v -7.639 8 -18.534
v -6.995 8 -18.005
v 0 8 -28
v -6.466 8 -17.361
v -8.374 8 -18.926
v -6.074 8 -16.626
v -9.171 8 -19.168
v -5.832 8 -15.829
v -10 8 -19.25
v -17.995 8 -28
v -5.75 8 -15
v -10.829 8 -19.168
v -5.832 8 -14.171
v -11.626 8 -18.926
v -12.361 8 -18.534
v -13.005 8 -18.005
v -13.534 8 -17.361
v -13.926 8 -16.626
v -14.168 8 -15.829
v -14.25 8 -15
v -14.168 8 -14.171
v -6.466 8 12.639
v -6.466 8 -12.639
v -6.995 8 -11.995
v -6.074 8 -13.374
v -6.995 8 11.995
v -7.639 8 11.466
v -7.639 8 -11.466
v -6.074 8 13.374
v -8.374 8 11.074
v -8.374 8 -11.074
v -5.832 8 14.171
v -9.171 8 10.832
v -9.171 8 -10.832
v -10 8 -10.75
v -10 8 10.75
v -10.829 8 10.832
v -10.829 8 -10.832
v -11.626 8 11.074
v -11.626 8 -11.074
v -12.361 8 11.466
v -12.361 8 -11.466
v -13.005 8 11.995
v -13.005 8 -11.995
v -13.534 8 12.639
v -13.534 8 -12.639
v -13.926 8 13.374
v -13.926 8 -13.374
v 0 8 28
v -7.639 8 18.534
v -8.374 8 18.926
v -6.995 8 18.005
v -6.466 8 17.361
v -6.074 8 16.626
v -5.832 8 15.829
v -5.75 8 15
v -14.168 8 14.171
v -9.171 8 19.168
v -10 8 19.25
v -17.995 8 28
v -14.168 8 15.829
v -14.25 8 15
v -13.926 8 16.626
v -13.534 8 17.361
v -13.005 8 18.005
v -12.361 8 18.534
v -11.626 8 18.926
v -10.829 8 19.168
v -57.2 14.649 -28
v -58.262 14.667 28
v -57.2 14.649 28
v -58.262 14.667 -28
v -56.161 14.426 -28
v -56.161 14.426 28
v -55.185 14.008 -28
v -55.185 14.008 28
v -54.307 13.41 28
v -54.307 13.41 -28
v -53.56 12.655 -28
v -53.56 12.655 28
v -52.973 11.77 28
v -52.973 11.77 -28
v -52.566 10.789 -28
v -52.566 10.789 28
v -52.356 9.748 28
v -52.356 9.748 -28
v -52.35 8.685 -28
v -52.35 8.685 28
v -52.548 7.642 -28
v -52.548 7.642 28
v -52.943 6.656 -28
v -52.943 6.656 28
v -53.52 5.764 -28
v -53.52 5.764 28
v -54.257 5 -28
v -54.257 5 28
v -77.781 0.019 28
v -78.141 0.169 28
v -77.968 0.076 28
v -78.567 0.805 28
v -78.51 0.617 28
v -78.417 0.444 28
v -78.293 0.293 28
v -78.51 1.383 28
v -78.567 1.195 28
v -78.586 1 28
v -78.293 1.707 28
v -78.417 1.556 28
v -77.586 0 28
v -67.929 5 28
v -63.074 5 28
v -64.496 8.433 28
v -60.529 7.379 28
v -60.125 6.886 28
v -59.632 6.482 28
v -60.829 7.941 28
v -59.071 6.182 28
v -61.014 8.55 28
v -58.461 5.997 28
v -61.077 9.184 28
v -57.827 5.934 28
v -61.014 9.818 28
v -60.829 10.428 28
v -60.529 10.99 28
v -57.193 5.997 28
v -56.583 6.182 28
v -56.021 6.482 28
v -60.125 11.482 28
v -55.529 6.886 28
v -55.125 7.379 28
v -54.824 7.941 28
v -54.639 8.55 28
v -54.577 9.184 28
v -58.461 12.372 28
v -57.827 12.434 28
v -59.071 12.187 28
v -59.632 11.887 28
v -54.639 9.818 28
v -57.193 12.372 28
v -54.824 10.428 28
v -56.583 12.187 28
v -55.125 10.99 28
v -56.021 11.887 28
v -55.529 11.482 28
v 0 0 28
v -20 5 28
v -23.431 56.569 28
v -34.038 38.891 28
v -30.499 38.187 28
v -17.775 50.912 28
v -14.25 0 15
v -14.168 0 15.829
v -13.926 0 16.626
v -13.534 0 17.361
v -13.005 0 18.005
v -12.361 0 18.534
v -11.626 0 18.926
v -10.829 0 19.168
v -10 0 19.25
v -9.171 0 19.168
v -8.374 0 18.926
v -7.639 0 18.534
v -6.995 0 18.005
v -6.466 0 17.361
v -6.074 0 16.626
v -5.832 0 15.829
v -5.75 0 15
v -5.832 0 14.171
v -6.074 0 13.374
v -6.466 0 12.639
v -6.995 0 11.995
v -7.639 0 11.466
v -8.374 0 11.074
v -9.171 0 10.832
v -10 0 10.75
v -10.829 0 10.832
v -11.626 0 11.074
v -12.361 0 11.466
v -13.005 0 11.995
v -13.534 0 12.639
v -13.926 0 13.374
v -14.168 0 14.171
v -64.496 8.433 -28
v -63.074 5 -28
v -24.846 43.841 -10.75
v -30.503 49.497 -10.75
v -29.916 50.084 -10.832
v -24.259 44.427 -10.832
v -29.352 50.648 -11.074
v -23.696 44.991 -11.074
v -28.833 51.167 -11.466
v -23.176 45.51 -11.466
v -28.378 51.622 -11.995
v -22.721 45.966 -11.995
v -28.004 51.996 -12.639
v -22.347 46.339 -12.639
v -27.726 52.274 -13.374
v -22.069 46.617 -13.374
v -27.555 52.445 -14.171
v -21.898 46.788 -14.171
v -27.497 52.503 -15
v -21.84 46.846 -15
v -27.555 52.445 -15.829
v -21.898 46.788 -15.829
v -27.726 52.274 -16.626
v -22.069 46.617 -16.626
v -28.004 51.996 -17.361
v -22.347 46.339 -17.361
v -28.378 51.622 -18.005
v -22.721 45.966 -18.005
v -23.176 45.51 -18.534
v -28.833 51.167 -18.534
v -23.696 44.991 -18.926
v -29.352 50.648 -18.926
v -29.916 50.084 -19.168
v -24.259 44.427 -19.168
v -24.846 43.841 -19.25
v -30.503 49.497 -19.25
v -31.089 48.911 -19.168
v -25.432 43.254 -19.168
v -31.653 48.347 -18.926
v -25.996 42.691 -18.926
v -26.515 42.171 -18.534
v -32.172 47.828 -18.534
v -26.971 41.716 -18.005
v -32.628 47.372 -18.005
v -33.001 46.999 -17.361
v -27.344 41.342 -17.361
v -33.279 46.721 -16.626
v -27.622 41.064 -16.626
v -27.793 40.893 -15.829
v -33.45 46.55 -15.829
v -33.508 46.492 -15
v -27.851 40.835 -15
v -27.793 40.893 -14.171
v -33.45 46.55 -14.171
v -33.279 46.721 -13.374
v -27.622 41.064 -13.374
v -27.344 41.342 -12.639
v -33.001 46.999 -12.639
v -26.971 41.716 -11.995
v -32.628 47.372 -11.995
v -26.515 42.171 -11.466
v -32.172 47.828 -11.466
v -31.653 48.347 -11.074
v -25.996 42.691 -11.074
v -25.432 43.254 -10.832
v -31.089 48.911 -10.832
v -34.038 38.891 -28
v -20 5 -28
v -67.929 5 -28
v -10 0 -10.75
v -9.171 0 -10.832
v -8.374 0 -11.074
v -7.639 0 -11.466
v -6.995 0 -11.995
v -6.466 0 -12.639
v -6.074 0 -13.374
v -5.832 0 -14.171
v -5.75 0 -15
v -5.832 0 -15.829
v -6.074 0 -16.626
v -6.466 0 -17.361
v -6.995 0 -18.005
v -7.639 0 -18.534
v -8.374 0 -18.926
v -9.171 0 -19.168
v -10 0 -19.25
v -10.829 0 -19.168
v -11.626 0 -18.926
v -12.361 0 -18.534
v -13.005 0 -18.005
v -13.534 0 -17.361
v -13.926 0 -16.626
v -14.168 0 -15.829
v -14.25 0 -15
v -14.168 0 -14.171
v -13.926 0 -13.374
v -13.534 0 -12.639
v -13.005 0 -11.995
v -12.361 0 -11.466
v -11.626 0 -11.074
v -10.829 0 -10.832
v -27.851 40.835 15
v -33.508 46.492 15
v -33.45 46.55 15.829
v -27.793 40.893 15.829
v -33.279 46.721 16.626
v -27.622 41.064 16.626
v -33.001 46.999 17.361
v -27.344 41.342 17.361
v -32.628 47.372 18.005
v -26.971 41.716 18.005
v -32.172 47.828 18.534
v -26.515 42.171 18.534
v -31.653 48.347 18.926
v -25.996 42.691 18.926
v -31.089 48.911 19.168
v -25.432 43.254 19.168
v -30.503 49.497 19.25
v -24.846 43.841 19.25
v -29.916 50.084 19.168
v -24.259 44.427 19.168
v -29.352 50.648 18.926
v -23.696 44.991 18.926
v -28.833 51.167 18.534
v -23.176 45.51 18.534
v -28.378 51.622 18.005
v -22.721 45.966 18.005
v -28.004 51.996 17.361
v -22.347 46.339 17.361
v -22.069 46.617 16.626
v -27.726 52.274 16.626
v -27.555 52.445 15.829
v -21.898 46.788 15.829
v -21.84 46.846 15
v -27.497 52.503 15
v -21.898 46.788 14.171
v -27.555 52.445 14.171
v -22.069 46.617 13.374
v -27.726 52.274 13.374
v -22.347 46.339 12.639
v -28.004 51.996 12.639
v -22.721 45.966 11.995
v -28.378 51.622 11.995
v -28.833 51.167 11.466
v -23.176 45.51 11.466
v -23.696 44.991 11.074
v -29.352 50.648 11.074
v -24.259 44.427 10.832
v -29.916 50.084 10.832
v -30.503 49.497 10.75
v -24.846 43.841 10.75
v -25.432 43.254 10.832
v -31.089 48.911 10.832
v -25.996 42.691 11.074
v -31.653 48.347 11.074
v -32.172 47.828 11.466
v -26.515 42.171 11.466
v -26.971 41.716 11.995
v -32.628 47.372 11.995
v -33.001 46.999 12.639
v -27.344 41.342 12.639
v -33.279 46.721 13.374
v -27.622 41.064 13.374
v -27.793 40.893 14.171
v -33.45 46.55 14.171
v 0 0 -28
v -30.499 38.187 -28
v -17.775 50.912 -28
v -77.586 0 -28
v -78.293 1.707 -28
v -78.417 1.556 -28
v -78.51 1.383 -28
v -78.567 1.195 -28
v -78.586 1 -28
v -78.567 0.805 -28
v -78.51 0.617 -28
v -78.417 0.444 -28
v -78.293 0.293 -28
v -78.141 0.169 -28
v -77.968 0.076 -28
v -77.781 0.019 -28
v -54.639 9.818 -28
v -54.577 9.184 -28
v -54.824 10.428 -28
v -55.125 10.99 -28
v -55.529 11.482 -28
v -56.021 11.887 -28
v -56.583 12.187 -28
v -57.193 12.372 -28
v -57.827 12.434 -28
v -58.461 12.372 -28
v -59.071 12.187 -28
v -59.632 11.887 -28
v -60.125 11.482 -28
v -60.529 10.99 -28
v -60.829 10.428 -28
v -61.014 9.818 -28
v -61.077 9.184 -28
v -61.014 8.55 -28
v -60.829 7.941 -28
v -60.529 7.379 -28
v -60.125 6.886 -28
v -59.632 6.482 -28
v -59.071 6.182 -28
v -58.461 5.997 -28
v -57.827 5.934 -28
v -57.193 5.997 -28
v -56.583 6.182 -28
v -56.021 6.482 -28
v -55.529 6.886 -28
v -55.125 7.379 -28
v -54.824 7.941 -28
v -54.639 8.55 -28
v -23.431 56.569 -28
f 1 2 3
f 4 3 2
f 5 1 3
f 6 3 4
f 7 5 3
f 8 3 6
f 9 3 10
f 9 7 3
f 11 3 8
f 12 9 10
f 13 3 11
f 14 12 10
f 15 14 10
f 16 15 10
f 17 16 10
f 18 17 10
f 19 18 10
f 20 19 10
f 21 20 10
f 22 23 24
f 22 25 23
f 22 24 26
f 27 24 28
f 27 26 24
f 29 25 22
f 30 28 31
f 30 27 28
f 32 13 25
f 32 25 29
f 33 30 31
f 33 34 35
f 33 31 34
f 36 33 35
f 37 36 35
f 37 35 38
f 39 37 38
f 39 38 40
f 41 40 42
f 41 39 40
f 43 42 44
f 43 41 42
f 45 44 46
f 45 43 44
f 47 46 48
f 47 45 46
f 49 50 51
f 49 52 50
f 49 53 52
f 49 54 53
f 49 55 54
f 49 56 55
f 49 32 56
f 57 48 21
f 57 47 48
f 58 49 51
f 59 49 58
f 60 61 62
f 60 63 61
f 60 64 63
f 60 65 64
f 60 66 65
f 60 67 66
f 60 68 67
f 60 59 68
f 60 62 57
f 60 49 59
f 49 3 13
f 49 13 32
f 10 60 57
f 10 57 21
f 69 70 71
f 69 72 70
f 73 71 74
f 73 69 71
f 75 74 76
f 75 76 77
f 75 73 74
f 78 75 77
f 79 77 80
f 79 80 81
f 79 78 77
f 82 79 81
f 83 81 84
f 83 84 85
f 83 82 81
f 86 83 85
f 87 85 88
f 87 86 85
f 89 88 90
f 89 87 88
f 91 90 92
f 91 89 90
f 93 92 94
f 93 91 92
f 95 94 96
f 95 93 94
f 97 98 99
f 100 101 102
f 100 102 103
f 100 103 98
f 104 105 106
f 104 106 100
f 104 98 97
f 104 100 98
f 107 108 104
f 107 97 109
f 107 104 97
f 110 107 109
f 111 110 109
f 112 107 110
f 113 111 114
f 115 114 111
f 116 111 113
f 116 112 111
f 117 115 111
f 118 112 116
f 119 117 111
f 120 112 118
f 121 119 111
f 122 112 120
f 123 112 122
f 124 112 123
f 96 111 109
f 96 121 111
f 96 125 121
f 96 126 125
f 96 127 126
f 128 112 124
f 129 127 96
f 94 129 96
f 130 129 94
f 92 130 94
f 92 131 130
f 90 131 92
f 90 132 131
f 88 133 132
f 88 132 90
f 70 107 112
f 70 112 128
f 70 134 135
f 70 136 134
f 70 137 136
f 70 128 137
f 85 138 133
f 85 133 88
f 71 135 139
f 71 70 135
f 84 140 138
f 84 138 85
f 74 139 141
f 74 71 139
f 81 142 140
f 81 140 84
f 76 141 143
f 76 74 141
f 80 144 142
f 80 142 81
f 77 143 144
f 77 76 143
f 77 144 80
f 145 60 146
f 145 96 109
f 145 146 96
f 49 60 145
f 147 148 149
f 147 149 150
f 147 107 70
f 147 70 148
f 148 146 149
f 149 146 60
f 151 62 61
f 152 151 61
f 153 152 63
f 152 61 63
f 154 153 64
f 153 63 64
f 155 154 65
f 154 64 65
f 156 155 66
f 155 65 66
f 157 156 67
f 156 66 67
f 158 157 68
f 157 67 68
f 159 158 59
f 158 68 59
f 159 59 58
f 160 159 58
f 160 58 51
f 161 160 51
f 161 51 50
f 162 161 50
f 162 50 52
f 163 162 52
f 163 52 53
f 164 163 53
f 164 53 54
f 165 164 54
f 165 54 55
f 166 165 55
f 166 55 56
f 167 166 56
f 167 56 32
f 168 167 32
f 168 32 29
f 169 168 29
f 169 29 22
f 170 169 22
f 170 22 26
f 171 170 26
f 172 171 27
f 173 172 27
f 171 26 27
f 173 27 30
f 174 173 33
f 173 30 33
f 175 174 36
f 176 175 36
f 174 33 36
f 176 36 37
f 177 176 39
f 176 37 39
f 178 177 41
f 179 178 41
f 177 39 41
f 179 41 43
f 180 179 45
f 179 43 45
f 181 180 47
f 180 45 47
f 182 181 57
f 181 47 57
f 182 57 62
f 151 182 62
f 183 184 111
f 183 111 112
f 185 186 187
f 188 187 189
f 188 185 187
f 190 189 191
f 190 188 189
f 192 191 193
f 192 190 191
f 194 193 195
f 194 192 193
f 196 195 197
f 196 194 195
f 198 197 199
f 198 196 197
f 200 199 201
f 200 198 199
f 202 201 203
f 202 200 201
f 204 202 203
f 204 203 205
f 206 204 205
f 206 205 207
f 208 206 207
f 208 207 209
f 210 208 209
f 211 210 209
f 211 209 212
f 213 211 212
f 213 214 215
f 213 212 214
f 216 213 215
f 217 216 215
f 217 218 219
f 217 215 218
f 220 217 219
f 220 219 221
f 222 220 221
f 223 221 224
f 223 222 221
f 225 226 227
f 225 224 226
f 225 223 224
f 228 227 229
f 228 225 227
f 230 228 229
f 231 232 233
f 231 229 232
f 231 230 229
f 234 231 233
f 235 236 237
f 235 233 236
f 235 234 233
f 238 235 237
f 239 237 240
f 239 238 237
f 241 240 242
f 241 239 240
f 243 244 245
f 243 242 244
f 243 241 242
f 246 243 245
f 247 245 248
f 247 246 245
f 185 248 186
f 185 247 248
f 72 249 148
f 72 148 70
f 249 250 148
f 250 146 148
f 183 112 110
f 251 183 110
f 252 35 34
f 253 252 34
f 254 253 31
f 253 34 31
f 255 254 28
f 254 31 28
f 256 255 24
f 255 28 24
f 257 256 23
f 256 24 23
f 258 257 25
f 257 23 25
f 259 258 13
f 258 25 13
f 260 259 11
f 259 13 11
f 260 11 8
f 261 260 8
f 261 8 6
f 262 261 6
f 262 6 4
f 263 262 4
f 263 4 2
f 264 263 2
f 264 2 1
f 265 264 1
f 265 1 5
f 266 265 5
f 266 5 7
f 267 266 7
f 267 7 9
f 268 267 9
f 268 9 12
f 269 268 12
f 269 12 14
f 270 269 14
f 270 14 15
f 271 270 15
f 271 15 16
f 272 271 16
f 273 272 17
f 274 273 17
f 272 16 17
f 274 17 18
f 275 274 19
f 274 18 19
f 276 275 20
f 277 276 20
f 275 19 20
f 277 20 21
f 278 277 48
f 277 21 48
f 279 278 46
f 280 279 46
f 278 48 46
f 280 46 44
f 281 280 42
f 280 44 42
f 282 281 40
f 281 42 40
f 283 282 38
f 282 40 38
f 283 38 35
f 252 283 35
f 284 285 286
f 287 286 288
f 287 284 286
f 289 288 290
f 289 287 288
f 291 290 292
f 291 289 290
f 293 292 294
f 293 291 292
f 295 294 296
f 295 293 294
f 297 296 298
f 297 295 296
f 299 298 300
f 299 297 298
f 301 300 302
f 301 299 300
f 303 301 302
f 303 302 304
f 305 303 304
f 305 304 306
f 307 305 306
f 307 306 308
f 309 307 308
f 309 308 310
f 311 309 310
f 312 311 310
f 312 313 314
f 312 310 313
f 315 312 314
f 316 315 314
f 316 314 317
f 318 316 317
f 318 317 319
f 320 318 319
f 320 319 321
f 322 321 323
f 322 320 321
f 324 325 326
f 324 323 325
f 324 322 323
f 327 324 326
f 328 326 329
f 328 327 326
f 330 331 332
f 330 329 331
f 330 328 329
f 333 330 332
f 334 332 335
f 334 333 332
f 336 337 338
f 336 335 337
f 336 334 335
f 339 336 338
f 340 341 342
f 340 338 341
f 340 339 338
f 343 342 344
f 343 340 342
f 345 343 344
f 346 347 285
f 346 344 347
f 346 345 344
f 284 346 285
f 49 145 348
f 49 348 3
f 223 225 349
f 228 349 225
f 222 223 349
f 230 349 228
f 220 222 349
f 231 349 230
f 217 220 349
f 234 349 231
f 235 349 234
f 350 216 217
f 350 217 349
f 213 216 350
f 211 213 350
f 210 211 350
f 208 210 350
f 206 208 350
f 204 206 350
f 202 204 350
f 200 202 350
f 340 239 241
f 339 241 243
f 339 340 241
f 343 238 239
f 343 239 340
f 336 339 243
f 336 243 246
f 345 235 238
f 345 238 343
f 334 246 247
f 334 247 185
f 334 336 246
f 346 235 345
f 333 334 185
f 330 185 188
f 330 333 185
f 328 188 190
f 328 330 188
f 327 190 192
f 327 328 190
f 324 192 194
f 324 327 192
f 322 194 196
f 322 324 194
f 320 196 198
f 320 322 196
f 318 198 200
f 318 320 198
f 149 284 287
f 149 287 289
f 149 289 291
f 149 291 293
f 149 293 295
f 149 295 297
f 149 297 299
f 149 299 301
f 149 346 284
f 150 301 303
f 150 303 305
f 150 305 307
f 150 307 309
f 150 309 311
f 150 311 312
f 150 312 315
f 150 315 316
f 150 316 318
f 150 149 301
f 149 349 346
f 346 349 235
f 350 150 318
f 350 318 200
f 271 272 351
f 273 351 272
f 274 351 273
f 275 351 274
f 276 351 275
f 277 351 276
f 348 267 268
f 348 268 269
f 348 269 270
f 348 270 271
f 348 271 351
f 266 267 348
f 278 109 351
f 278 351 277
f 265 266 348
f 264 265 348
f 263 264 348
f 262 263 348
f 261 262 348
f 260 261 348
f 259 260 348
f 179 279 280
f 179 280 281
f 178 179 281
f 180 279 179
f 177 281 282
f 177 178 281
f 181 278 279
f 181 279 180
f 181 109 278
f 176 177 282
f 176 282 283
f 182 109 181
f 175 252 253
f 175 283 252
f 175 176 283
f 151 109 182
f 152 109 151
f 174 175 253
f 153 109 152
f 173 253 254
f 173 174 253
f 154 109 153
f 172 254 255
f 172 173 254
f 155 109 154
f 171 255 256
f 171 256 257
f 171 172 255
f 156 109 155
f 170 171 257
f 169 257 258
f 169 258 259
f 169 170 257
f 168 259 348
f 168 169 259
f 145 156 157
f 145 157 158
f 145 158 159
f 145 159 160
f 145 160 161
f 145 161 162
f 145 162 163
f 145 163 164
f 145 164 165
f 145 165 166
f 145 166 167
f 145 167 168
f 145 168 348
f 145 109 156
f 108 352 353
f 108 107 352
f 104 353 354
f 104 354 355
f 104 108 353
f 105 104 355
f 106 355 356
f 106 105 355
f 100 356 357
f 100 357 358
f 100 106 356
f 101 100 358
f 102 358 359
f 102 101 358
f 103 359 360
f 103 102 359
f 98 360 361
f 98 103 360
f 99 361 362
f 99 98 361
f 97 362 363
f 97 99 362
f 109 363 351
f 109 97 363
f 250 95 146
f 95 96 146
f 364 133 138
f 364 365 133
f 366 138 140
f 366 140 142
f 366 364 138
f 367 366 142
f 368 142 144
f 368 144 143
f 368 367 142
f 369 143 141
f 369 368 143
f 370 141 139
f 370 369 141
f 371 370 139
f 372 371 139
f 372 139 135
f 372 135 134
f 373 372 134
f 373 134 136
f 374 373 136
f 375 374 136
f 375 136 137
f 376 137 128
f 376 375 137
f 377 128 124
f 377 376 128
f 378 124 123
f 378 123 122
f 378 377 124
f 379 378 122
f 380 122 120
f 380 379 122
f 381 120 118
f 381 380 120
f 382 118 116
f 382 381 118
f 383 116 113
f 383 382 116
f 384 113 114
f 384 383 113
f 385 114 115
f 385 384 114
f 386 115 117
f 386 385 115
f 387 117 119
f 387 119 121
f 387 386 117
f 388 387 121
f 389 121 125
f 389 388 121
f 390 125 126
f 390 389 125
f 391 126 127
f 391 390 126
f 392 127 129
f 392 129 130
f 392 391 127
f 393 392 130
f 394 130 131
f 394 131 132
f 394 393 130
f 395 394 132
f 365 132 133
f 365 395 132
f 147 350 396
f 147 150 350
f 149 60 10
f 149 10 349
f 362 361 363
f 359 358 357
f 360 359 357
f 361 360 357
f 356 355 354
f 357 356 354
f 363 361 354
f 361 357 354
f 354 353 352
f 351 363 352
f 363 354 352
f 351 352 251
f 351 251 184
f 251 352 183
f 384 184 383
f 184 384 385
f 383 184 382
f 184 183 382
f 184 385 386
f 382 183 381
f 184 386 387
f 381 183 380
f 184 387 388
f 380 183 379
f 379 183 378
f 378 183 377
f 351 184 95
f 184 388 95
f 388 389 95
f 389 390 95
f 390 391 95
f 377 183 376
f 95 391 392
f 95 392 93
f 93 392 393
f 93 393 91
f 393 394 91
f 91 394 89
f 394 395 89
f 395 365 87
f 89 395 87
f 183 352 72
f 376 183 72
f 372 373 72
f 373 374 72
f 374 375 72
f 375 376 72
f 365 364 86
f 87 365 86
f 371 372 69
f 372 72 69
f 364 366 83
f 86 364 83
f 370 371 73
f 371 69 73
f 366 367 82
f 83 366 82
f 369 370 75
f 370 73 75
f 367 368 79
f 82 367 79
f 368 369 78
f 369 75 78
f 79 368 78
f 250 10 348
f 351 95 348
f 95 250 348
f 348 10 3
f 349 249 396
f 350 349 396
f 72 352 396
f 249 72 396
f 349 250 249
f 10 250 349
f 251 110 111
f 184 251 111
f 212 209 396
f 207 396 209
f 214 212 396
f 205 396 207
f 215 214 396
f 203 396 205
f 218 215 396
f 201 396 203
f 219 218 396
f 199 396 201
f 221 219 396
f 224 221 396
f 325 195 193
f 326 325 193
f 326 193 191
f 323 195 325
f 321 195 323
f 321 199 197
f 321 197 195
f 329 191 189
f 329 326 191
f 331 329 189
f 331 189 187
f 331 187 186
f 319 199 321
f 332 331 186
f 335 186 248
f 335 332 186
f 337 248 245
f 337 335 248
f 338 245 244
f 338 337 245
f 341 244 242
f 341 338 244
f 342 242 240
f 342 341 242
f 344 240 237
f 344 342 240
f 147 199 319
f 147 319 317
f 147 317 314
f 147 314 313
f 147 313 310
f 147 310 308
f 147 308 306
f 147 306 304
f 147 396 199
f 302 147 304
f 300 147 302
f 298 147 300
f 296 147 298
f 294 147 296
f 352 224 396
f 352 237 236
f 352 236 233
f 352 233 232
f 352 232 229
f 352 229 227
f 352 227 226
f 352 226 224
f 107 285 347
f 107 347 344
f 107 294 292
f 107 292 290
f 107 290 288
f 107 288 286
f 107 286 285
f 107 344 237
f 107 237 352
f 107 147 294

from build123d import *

# Parameters (mm, degrees)
SKETCH_1_R          = 3.25
EXTRUDE_1_DEPTH     = 28
SKETCH_3_R          = 4.25
CUT_EXTRUDE_1_DEPTH = 17


with BuildPart() as part:
    # 草图1 → 凸台-拉伸1 (new, symmetric)
    with BuildSketch(Plane.XY):
        with BuildLine():
            Line((-77.585786438, 0), (0, 0))
            Line((0, 0), (0, 8))
            Line((0, 8), (-17.995464086, 8))
            Line((-17.995464086, 8), (-30.499317942, 38.186973559))
            Line((-30.499317942, 38.186973559), (-17.774603256, 50.911688245))
            Line((-17.774603256, 50.911688245), (-23.431457505, 56.568542495))
            Line((-23.431457505, 56.568542495), (-78.292893219, 1.707106781))
            ThreePointArc((-78.292893219, 1.707106781), (-78.50966597, 0.617316568), (-77.585786438, 0))
        make_face()
        with Locations((-57.82689122, 9.184402377)):
            Circle(SKETCH_1_R, mode=Mode.SUBTRACT)
        Polygon((-67.928932188, 5), (-63.07447047, 5), (-64.496309389, 8.4326228), align=None, mode=Mode.SUBTRACT)
        with BuildLine():
            Line((-54.257468753, 5), (-20, 5))
            Line((-20, 5), (-34.038059223, 38.890872965))
            Line((-34.038059223, 38.890872965), (-58.261747684, 14.667184504))
            ThreePointArc((-58.261747684, 14.667184504), (-52.745553791, 11.289161255), (-54.257468753, 5))
        make_face(mode=Mode.SUBTRACT)
    extrude(amount=EXTRUDE_1_DEPTH, both=True)

    # 草图3 → 切除-拉伸1 (cut)
    with BuildSketch(Plane(origin=(0, 8, 0), x_dir=(1, 0, 0), z_dir=(0, 1, 0))):
        with Locations(Location((-10, -15, 0), (0, 0, 180))):
            Circle(SKETCH_3_R)
        with Locations(Location((-10, 15, 0), (0, 0, 270))):
            Circle(SKETCH_3_R)
    cut_extrude_1 = extrude(amount=-CUT_EXTRUDE_1_DEPTH, mode=Mode.SUBTRACT)

    # 镜向1: 切除-拉伸1 across plane
    add(cut_extrude_1.mirror(Plane(origin=(-11.715728753, 28.284271247, 0), x_dir=(0, 0, 1), z_dir=(-0.3826834323650881, 0.9238795325112875, 0))), mode=Mode.SUBTRACT)


solid = part.part
